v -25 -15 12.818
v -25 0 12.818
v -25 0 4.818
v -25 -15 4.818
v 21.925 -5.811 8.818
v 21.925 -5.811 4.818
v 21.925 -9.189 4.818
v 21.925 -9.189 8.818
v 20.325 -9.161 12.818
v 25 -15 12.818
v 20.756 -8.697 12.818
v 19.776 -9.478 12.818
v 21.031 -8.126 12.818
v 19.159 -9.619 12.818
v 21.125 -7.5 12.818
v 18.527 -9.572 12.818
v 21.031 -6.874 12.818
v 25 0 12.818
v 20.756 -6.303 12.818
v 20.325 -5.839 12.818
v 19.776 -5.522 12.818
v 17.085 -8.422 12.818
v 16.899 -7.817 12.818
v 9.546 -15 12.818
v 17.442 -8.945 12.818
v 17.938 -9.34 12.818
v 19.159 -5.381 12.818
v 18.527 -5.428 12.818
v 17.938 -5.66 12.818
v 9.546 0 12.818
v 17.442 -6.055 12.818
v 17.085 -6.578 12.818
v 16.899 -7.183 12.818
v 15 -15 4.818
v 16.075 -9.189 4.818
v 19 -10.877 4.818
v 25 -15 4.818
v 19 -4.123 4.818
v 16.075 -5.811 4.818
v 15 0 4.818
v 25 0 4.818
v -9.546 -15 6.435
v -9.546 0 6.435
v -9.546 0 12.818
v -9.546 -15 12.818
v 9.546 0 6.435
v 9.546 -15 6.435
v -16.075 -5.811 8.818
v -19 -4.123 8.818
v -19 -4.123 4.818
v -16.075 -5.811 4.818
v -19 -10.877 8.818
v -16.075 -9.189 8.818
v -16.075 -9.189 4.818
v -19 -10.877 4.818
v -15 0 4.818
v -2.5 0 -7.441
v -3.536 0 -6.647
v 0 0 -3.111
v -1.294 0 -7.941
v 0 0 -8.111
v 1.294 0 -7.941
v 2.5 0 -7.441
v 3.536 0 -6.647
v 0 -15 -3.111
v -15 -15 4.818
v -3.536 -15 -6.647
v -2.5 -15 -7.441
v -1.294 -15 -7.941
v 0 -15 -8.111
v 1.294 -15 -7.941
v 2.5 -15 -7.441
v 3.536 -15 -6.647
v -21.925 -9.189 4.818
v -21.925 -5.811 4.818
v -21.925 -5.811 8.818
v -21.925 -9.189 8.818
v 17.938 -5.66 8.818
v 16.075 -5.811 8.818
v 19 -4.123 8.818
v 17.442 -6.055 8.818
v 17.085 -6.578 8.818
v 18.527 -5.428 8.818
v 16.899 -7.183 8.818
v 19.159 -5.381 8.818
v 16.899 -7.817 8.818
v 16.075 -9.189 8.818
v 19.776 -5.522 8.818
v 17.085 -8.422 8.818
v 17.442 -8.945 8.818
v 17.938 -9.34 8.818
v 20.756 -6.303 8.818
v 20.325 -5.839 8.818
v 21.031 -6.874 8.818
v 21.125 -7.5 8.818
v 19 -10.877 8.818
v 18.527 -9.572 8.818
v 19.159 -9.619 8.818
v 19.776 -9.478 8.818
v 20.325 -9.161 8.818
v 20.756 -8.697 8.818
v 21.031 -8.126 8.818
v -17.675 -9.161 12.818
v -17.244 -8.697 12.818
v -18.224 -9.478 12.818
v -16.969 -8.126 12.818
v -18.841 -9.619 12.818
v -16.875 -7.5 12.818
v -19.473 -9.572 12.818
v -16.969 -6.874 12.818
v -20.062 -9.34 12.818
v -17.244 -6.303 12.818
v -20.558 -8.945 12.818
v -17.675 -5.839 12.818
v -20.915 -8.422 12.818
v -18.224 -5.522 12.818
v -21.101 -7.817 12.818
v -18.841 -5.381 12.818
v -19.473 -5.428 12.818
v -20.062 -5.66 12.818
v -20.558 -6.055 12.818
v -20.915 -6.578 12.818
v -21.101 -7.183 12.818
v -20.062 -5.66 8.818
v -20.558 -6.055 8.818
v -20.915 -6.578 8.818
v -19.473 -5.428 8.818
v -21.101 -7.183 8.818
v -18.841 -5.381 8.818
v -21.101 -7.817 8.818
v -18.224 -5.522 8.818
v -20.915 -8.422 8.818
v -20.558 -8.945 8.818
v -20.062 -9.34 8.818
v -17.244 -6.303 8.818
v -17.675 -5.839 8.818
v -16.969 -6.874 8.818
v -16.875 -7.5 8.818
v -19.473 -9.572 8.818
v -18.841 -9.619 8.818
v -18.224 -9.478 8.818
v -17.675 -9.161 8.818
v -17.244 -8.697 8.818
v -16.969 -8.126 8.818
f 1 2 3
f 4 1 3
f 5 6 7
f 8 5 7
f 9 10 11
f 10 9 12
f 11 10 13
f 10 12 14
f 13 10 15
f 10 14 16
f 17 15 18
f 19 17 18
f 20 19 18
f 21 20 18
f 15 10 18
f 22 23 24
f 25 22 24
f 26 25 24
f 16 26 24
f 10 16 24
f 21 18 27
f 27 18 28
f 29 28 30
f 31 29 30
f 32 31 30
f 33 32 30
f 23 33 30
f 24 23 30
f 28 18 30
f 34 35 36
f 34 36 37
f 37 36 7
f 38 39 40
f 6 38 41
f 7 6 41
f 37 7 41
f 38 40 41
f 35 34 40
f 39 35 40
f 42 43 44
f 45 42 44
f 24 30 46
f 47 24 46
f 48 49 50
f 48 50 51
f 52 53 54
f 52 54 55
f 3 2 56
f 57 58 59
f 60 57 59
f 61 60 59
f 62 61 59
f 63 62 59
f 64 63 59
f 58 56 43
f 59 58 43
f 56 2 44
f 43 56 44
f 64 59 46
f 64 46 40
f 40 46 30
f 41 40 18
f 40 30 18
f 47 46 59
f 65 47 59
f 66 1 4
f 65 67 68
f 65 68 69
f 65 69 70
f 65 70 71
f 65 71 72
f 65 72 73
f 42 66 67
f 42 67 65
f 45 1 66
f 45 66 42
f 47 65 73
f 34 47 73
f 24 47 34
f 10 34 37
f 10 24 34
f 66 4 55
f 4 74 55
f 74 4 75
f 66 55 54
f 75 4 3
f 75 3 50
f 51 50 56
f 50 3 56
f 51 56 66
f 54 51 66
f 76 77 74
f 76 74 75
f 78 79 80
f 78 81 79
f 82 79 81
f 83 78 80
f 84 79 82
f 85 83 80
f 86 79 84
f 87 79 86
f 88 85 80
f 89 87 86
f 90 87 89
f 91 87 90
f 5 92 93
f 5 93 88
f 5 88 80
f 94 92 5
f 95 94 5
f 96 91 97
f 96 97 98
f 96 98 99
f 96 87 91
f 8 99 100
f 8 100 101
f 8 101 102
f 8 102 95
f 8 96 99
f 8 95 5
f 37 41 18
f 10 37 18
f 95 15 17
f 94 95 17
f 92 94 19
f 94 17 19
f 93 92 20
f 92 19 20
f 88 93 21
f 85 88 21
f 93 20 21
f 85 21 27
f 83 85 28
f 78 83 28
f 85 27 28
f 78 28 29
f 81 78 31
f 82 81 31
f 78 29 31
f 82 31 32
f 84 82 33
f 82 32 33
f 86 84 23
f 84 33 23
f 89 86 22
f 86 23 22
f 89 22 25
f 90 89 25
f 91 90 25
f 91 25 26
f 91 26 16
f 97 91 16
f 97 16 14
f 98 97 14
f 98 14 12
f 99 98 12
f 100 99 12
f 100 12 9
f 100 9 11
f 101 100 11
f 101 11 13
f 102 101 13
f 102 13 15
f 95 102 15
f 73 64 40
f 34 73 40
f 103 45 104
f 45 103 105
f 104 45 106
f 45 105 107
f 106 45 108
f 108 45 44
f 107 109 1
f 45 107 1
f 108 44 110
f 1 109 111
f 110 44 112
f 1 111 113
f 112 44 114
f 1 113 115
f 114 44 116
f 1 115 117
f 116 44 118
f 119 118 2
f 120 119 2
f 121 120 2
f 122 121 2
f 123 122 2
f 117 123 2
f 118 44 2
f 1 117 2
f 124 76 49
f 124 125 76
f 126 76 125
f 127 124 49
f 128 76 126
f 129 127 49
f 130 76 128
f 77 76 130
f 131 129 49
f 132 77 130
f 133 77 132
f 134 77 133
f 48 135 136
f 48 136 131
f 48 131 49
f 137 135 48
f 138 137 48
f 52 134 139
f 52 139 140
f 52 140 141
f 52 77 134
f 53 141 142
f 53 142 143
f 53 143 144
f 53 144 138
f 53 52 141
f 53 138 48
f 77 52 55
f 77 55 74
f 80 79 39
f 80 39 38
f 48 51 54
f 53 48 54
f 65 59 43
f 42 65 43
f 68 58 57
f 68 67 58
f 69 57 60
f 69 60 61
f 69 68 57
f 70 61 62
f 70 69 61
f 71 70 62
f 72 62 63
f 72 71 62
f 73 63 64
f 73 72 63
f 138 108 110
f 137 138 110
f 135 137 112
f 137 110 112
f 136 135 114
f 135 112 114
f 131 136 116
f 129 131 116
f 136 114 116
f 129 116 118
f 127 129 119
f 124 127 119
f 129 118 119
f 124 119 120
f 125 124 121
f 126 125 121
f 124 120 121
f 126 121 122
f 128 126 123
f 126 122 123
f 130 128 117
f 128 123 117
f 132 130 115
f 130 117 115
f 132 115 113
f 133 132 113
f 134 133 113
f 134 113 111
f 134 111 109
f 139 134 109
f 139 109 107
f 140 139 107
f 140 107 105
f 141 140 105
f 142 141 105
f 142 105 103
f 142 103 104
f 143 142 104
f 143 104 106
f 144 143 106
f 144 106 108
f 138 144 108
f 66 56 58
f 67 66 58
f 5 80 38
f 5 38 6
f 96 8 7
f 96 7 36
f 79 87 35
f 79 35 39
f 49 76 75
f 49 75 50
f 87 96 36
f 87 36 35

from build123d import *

# Parameters (mm, degrees)
F1_DEPTH = 15
F2_R     = 2.125
F3_DEPTH = 25
F5_DEPTH = 4
F6_R     = 5
F8_DEPTH = 25


# Not quite as in the source:
# - a feature names something its author has since deleted; it is built from what else it names


with BuildPart() as f1:
    # F0 (on Front) → F1 (new body)
    with BuildSketch(Plane.XZ):
        Polygon((25, 12.8176623509), (15, 12.8176623509), (9.545941546, 12.8176623509), (9.545941546, 6.4346717088), (0, -3.1112698372), (-9.545941546, 6.4346717088), (-9.545941546, 12.8176623509), (-15, 12.8176623509), (-25, 12.8176623509), (-25, 4.8176623509), (-15, 4.8176623509), (-7.5, -2.6823376491), (0, -10.1823376491), (7.5, -2.6823376491), (15, 4.8176623509), (25, 4.8176623509), align=None)
    extrude(amount=F1_DEPTH)

    # F2 (on face) → F3 (cut)
    with BuildSketch(Plane.XY.offset(12.8176623509)):
        with Locations((-19, -7.5)):
            Circle(F2_R)
        with Locations((19, -7.5)):
            Circle(F2_R)
    extrude(amount=-F3_DEPTH, mode=Mode.SUBTRACT)

    # F4 (on face) → F5 (cut)
    with BuildSketch(Plane(origin=(0, 0, 4.8176623509), x_dir=(1, 0, 0), z_dir=(0, 0, -1))):
        Polygon((-21.925, 9.1887495374), (-21.925, 5.8112504626), (-19, 4.1225009252), (-16.075, 5.8112504626), (-16.075, 9.1887495374), (-19, 10.8774990748), align=None)
        Polygon((21.925, 5.8112504626), (21.925, 9.1887495374), (19, 10.8774990748), (16.075, 9.1887495374), (16.075, 5.8112504626), (19, 4.1225009252), align=None)
    extrude(amount=-F5_DEPTH, mode=Mode.SUBTRACT)

    # F6
    f6_edges = [f1.edges().sort_by_distance(p)[0] for p in [
        (0, -7.5, -10.182338),
    ]]
    fillet(f6_edges, radius=F6_R)

    # F7 (on face) → F8 (cut)
    with BuildSketch(Plane(origin=(0, 0, 8.8176623509), x_dir=(1, 0, 0), z_dir=(0, 0, -1))):
        Polygon((-21.925, 9.1887495374), (-21.925, 5.8112504626), (-19, 4.1225009252), (-16.075, 5.8112504626), (-16.075, 9.1887495374), (-19, 10.8774990748), align=None)
    extrude(amount=F8_DEPTH, mode=Mode.SUBTRACT)


solid = f1.part
